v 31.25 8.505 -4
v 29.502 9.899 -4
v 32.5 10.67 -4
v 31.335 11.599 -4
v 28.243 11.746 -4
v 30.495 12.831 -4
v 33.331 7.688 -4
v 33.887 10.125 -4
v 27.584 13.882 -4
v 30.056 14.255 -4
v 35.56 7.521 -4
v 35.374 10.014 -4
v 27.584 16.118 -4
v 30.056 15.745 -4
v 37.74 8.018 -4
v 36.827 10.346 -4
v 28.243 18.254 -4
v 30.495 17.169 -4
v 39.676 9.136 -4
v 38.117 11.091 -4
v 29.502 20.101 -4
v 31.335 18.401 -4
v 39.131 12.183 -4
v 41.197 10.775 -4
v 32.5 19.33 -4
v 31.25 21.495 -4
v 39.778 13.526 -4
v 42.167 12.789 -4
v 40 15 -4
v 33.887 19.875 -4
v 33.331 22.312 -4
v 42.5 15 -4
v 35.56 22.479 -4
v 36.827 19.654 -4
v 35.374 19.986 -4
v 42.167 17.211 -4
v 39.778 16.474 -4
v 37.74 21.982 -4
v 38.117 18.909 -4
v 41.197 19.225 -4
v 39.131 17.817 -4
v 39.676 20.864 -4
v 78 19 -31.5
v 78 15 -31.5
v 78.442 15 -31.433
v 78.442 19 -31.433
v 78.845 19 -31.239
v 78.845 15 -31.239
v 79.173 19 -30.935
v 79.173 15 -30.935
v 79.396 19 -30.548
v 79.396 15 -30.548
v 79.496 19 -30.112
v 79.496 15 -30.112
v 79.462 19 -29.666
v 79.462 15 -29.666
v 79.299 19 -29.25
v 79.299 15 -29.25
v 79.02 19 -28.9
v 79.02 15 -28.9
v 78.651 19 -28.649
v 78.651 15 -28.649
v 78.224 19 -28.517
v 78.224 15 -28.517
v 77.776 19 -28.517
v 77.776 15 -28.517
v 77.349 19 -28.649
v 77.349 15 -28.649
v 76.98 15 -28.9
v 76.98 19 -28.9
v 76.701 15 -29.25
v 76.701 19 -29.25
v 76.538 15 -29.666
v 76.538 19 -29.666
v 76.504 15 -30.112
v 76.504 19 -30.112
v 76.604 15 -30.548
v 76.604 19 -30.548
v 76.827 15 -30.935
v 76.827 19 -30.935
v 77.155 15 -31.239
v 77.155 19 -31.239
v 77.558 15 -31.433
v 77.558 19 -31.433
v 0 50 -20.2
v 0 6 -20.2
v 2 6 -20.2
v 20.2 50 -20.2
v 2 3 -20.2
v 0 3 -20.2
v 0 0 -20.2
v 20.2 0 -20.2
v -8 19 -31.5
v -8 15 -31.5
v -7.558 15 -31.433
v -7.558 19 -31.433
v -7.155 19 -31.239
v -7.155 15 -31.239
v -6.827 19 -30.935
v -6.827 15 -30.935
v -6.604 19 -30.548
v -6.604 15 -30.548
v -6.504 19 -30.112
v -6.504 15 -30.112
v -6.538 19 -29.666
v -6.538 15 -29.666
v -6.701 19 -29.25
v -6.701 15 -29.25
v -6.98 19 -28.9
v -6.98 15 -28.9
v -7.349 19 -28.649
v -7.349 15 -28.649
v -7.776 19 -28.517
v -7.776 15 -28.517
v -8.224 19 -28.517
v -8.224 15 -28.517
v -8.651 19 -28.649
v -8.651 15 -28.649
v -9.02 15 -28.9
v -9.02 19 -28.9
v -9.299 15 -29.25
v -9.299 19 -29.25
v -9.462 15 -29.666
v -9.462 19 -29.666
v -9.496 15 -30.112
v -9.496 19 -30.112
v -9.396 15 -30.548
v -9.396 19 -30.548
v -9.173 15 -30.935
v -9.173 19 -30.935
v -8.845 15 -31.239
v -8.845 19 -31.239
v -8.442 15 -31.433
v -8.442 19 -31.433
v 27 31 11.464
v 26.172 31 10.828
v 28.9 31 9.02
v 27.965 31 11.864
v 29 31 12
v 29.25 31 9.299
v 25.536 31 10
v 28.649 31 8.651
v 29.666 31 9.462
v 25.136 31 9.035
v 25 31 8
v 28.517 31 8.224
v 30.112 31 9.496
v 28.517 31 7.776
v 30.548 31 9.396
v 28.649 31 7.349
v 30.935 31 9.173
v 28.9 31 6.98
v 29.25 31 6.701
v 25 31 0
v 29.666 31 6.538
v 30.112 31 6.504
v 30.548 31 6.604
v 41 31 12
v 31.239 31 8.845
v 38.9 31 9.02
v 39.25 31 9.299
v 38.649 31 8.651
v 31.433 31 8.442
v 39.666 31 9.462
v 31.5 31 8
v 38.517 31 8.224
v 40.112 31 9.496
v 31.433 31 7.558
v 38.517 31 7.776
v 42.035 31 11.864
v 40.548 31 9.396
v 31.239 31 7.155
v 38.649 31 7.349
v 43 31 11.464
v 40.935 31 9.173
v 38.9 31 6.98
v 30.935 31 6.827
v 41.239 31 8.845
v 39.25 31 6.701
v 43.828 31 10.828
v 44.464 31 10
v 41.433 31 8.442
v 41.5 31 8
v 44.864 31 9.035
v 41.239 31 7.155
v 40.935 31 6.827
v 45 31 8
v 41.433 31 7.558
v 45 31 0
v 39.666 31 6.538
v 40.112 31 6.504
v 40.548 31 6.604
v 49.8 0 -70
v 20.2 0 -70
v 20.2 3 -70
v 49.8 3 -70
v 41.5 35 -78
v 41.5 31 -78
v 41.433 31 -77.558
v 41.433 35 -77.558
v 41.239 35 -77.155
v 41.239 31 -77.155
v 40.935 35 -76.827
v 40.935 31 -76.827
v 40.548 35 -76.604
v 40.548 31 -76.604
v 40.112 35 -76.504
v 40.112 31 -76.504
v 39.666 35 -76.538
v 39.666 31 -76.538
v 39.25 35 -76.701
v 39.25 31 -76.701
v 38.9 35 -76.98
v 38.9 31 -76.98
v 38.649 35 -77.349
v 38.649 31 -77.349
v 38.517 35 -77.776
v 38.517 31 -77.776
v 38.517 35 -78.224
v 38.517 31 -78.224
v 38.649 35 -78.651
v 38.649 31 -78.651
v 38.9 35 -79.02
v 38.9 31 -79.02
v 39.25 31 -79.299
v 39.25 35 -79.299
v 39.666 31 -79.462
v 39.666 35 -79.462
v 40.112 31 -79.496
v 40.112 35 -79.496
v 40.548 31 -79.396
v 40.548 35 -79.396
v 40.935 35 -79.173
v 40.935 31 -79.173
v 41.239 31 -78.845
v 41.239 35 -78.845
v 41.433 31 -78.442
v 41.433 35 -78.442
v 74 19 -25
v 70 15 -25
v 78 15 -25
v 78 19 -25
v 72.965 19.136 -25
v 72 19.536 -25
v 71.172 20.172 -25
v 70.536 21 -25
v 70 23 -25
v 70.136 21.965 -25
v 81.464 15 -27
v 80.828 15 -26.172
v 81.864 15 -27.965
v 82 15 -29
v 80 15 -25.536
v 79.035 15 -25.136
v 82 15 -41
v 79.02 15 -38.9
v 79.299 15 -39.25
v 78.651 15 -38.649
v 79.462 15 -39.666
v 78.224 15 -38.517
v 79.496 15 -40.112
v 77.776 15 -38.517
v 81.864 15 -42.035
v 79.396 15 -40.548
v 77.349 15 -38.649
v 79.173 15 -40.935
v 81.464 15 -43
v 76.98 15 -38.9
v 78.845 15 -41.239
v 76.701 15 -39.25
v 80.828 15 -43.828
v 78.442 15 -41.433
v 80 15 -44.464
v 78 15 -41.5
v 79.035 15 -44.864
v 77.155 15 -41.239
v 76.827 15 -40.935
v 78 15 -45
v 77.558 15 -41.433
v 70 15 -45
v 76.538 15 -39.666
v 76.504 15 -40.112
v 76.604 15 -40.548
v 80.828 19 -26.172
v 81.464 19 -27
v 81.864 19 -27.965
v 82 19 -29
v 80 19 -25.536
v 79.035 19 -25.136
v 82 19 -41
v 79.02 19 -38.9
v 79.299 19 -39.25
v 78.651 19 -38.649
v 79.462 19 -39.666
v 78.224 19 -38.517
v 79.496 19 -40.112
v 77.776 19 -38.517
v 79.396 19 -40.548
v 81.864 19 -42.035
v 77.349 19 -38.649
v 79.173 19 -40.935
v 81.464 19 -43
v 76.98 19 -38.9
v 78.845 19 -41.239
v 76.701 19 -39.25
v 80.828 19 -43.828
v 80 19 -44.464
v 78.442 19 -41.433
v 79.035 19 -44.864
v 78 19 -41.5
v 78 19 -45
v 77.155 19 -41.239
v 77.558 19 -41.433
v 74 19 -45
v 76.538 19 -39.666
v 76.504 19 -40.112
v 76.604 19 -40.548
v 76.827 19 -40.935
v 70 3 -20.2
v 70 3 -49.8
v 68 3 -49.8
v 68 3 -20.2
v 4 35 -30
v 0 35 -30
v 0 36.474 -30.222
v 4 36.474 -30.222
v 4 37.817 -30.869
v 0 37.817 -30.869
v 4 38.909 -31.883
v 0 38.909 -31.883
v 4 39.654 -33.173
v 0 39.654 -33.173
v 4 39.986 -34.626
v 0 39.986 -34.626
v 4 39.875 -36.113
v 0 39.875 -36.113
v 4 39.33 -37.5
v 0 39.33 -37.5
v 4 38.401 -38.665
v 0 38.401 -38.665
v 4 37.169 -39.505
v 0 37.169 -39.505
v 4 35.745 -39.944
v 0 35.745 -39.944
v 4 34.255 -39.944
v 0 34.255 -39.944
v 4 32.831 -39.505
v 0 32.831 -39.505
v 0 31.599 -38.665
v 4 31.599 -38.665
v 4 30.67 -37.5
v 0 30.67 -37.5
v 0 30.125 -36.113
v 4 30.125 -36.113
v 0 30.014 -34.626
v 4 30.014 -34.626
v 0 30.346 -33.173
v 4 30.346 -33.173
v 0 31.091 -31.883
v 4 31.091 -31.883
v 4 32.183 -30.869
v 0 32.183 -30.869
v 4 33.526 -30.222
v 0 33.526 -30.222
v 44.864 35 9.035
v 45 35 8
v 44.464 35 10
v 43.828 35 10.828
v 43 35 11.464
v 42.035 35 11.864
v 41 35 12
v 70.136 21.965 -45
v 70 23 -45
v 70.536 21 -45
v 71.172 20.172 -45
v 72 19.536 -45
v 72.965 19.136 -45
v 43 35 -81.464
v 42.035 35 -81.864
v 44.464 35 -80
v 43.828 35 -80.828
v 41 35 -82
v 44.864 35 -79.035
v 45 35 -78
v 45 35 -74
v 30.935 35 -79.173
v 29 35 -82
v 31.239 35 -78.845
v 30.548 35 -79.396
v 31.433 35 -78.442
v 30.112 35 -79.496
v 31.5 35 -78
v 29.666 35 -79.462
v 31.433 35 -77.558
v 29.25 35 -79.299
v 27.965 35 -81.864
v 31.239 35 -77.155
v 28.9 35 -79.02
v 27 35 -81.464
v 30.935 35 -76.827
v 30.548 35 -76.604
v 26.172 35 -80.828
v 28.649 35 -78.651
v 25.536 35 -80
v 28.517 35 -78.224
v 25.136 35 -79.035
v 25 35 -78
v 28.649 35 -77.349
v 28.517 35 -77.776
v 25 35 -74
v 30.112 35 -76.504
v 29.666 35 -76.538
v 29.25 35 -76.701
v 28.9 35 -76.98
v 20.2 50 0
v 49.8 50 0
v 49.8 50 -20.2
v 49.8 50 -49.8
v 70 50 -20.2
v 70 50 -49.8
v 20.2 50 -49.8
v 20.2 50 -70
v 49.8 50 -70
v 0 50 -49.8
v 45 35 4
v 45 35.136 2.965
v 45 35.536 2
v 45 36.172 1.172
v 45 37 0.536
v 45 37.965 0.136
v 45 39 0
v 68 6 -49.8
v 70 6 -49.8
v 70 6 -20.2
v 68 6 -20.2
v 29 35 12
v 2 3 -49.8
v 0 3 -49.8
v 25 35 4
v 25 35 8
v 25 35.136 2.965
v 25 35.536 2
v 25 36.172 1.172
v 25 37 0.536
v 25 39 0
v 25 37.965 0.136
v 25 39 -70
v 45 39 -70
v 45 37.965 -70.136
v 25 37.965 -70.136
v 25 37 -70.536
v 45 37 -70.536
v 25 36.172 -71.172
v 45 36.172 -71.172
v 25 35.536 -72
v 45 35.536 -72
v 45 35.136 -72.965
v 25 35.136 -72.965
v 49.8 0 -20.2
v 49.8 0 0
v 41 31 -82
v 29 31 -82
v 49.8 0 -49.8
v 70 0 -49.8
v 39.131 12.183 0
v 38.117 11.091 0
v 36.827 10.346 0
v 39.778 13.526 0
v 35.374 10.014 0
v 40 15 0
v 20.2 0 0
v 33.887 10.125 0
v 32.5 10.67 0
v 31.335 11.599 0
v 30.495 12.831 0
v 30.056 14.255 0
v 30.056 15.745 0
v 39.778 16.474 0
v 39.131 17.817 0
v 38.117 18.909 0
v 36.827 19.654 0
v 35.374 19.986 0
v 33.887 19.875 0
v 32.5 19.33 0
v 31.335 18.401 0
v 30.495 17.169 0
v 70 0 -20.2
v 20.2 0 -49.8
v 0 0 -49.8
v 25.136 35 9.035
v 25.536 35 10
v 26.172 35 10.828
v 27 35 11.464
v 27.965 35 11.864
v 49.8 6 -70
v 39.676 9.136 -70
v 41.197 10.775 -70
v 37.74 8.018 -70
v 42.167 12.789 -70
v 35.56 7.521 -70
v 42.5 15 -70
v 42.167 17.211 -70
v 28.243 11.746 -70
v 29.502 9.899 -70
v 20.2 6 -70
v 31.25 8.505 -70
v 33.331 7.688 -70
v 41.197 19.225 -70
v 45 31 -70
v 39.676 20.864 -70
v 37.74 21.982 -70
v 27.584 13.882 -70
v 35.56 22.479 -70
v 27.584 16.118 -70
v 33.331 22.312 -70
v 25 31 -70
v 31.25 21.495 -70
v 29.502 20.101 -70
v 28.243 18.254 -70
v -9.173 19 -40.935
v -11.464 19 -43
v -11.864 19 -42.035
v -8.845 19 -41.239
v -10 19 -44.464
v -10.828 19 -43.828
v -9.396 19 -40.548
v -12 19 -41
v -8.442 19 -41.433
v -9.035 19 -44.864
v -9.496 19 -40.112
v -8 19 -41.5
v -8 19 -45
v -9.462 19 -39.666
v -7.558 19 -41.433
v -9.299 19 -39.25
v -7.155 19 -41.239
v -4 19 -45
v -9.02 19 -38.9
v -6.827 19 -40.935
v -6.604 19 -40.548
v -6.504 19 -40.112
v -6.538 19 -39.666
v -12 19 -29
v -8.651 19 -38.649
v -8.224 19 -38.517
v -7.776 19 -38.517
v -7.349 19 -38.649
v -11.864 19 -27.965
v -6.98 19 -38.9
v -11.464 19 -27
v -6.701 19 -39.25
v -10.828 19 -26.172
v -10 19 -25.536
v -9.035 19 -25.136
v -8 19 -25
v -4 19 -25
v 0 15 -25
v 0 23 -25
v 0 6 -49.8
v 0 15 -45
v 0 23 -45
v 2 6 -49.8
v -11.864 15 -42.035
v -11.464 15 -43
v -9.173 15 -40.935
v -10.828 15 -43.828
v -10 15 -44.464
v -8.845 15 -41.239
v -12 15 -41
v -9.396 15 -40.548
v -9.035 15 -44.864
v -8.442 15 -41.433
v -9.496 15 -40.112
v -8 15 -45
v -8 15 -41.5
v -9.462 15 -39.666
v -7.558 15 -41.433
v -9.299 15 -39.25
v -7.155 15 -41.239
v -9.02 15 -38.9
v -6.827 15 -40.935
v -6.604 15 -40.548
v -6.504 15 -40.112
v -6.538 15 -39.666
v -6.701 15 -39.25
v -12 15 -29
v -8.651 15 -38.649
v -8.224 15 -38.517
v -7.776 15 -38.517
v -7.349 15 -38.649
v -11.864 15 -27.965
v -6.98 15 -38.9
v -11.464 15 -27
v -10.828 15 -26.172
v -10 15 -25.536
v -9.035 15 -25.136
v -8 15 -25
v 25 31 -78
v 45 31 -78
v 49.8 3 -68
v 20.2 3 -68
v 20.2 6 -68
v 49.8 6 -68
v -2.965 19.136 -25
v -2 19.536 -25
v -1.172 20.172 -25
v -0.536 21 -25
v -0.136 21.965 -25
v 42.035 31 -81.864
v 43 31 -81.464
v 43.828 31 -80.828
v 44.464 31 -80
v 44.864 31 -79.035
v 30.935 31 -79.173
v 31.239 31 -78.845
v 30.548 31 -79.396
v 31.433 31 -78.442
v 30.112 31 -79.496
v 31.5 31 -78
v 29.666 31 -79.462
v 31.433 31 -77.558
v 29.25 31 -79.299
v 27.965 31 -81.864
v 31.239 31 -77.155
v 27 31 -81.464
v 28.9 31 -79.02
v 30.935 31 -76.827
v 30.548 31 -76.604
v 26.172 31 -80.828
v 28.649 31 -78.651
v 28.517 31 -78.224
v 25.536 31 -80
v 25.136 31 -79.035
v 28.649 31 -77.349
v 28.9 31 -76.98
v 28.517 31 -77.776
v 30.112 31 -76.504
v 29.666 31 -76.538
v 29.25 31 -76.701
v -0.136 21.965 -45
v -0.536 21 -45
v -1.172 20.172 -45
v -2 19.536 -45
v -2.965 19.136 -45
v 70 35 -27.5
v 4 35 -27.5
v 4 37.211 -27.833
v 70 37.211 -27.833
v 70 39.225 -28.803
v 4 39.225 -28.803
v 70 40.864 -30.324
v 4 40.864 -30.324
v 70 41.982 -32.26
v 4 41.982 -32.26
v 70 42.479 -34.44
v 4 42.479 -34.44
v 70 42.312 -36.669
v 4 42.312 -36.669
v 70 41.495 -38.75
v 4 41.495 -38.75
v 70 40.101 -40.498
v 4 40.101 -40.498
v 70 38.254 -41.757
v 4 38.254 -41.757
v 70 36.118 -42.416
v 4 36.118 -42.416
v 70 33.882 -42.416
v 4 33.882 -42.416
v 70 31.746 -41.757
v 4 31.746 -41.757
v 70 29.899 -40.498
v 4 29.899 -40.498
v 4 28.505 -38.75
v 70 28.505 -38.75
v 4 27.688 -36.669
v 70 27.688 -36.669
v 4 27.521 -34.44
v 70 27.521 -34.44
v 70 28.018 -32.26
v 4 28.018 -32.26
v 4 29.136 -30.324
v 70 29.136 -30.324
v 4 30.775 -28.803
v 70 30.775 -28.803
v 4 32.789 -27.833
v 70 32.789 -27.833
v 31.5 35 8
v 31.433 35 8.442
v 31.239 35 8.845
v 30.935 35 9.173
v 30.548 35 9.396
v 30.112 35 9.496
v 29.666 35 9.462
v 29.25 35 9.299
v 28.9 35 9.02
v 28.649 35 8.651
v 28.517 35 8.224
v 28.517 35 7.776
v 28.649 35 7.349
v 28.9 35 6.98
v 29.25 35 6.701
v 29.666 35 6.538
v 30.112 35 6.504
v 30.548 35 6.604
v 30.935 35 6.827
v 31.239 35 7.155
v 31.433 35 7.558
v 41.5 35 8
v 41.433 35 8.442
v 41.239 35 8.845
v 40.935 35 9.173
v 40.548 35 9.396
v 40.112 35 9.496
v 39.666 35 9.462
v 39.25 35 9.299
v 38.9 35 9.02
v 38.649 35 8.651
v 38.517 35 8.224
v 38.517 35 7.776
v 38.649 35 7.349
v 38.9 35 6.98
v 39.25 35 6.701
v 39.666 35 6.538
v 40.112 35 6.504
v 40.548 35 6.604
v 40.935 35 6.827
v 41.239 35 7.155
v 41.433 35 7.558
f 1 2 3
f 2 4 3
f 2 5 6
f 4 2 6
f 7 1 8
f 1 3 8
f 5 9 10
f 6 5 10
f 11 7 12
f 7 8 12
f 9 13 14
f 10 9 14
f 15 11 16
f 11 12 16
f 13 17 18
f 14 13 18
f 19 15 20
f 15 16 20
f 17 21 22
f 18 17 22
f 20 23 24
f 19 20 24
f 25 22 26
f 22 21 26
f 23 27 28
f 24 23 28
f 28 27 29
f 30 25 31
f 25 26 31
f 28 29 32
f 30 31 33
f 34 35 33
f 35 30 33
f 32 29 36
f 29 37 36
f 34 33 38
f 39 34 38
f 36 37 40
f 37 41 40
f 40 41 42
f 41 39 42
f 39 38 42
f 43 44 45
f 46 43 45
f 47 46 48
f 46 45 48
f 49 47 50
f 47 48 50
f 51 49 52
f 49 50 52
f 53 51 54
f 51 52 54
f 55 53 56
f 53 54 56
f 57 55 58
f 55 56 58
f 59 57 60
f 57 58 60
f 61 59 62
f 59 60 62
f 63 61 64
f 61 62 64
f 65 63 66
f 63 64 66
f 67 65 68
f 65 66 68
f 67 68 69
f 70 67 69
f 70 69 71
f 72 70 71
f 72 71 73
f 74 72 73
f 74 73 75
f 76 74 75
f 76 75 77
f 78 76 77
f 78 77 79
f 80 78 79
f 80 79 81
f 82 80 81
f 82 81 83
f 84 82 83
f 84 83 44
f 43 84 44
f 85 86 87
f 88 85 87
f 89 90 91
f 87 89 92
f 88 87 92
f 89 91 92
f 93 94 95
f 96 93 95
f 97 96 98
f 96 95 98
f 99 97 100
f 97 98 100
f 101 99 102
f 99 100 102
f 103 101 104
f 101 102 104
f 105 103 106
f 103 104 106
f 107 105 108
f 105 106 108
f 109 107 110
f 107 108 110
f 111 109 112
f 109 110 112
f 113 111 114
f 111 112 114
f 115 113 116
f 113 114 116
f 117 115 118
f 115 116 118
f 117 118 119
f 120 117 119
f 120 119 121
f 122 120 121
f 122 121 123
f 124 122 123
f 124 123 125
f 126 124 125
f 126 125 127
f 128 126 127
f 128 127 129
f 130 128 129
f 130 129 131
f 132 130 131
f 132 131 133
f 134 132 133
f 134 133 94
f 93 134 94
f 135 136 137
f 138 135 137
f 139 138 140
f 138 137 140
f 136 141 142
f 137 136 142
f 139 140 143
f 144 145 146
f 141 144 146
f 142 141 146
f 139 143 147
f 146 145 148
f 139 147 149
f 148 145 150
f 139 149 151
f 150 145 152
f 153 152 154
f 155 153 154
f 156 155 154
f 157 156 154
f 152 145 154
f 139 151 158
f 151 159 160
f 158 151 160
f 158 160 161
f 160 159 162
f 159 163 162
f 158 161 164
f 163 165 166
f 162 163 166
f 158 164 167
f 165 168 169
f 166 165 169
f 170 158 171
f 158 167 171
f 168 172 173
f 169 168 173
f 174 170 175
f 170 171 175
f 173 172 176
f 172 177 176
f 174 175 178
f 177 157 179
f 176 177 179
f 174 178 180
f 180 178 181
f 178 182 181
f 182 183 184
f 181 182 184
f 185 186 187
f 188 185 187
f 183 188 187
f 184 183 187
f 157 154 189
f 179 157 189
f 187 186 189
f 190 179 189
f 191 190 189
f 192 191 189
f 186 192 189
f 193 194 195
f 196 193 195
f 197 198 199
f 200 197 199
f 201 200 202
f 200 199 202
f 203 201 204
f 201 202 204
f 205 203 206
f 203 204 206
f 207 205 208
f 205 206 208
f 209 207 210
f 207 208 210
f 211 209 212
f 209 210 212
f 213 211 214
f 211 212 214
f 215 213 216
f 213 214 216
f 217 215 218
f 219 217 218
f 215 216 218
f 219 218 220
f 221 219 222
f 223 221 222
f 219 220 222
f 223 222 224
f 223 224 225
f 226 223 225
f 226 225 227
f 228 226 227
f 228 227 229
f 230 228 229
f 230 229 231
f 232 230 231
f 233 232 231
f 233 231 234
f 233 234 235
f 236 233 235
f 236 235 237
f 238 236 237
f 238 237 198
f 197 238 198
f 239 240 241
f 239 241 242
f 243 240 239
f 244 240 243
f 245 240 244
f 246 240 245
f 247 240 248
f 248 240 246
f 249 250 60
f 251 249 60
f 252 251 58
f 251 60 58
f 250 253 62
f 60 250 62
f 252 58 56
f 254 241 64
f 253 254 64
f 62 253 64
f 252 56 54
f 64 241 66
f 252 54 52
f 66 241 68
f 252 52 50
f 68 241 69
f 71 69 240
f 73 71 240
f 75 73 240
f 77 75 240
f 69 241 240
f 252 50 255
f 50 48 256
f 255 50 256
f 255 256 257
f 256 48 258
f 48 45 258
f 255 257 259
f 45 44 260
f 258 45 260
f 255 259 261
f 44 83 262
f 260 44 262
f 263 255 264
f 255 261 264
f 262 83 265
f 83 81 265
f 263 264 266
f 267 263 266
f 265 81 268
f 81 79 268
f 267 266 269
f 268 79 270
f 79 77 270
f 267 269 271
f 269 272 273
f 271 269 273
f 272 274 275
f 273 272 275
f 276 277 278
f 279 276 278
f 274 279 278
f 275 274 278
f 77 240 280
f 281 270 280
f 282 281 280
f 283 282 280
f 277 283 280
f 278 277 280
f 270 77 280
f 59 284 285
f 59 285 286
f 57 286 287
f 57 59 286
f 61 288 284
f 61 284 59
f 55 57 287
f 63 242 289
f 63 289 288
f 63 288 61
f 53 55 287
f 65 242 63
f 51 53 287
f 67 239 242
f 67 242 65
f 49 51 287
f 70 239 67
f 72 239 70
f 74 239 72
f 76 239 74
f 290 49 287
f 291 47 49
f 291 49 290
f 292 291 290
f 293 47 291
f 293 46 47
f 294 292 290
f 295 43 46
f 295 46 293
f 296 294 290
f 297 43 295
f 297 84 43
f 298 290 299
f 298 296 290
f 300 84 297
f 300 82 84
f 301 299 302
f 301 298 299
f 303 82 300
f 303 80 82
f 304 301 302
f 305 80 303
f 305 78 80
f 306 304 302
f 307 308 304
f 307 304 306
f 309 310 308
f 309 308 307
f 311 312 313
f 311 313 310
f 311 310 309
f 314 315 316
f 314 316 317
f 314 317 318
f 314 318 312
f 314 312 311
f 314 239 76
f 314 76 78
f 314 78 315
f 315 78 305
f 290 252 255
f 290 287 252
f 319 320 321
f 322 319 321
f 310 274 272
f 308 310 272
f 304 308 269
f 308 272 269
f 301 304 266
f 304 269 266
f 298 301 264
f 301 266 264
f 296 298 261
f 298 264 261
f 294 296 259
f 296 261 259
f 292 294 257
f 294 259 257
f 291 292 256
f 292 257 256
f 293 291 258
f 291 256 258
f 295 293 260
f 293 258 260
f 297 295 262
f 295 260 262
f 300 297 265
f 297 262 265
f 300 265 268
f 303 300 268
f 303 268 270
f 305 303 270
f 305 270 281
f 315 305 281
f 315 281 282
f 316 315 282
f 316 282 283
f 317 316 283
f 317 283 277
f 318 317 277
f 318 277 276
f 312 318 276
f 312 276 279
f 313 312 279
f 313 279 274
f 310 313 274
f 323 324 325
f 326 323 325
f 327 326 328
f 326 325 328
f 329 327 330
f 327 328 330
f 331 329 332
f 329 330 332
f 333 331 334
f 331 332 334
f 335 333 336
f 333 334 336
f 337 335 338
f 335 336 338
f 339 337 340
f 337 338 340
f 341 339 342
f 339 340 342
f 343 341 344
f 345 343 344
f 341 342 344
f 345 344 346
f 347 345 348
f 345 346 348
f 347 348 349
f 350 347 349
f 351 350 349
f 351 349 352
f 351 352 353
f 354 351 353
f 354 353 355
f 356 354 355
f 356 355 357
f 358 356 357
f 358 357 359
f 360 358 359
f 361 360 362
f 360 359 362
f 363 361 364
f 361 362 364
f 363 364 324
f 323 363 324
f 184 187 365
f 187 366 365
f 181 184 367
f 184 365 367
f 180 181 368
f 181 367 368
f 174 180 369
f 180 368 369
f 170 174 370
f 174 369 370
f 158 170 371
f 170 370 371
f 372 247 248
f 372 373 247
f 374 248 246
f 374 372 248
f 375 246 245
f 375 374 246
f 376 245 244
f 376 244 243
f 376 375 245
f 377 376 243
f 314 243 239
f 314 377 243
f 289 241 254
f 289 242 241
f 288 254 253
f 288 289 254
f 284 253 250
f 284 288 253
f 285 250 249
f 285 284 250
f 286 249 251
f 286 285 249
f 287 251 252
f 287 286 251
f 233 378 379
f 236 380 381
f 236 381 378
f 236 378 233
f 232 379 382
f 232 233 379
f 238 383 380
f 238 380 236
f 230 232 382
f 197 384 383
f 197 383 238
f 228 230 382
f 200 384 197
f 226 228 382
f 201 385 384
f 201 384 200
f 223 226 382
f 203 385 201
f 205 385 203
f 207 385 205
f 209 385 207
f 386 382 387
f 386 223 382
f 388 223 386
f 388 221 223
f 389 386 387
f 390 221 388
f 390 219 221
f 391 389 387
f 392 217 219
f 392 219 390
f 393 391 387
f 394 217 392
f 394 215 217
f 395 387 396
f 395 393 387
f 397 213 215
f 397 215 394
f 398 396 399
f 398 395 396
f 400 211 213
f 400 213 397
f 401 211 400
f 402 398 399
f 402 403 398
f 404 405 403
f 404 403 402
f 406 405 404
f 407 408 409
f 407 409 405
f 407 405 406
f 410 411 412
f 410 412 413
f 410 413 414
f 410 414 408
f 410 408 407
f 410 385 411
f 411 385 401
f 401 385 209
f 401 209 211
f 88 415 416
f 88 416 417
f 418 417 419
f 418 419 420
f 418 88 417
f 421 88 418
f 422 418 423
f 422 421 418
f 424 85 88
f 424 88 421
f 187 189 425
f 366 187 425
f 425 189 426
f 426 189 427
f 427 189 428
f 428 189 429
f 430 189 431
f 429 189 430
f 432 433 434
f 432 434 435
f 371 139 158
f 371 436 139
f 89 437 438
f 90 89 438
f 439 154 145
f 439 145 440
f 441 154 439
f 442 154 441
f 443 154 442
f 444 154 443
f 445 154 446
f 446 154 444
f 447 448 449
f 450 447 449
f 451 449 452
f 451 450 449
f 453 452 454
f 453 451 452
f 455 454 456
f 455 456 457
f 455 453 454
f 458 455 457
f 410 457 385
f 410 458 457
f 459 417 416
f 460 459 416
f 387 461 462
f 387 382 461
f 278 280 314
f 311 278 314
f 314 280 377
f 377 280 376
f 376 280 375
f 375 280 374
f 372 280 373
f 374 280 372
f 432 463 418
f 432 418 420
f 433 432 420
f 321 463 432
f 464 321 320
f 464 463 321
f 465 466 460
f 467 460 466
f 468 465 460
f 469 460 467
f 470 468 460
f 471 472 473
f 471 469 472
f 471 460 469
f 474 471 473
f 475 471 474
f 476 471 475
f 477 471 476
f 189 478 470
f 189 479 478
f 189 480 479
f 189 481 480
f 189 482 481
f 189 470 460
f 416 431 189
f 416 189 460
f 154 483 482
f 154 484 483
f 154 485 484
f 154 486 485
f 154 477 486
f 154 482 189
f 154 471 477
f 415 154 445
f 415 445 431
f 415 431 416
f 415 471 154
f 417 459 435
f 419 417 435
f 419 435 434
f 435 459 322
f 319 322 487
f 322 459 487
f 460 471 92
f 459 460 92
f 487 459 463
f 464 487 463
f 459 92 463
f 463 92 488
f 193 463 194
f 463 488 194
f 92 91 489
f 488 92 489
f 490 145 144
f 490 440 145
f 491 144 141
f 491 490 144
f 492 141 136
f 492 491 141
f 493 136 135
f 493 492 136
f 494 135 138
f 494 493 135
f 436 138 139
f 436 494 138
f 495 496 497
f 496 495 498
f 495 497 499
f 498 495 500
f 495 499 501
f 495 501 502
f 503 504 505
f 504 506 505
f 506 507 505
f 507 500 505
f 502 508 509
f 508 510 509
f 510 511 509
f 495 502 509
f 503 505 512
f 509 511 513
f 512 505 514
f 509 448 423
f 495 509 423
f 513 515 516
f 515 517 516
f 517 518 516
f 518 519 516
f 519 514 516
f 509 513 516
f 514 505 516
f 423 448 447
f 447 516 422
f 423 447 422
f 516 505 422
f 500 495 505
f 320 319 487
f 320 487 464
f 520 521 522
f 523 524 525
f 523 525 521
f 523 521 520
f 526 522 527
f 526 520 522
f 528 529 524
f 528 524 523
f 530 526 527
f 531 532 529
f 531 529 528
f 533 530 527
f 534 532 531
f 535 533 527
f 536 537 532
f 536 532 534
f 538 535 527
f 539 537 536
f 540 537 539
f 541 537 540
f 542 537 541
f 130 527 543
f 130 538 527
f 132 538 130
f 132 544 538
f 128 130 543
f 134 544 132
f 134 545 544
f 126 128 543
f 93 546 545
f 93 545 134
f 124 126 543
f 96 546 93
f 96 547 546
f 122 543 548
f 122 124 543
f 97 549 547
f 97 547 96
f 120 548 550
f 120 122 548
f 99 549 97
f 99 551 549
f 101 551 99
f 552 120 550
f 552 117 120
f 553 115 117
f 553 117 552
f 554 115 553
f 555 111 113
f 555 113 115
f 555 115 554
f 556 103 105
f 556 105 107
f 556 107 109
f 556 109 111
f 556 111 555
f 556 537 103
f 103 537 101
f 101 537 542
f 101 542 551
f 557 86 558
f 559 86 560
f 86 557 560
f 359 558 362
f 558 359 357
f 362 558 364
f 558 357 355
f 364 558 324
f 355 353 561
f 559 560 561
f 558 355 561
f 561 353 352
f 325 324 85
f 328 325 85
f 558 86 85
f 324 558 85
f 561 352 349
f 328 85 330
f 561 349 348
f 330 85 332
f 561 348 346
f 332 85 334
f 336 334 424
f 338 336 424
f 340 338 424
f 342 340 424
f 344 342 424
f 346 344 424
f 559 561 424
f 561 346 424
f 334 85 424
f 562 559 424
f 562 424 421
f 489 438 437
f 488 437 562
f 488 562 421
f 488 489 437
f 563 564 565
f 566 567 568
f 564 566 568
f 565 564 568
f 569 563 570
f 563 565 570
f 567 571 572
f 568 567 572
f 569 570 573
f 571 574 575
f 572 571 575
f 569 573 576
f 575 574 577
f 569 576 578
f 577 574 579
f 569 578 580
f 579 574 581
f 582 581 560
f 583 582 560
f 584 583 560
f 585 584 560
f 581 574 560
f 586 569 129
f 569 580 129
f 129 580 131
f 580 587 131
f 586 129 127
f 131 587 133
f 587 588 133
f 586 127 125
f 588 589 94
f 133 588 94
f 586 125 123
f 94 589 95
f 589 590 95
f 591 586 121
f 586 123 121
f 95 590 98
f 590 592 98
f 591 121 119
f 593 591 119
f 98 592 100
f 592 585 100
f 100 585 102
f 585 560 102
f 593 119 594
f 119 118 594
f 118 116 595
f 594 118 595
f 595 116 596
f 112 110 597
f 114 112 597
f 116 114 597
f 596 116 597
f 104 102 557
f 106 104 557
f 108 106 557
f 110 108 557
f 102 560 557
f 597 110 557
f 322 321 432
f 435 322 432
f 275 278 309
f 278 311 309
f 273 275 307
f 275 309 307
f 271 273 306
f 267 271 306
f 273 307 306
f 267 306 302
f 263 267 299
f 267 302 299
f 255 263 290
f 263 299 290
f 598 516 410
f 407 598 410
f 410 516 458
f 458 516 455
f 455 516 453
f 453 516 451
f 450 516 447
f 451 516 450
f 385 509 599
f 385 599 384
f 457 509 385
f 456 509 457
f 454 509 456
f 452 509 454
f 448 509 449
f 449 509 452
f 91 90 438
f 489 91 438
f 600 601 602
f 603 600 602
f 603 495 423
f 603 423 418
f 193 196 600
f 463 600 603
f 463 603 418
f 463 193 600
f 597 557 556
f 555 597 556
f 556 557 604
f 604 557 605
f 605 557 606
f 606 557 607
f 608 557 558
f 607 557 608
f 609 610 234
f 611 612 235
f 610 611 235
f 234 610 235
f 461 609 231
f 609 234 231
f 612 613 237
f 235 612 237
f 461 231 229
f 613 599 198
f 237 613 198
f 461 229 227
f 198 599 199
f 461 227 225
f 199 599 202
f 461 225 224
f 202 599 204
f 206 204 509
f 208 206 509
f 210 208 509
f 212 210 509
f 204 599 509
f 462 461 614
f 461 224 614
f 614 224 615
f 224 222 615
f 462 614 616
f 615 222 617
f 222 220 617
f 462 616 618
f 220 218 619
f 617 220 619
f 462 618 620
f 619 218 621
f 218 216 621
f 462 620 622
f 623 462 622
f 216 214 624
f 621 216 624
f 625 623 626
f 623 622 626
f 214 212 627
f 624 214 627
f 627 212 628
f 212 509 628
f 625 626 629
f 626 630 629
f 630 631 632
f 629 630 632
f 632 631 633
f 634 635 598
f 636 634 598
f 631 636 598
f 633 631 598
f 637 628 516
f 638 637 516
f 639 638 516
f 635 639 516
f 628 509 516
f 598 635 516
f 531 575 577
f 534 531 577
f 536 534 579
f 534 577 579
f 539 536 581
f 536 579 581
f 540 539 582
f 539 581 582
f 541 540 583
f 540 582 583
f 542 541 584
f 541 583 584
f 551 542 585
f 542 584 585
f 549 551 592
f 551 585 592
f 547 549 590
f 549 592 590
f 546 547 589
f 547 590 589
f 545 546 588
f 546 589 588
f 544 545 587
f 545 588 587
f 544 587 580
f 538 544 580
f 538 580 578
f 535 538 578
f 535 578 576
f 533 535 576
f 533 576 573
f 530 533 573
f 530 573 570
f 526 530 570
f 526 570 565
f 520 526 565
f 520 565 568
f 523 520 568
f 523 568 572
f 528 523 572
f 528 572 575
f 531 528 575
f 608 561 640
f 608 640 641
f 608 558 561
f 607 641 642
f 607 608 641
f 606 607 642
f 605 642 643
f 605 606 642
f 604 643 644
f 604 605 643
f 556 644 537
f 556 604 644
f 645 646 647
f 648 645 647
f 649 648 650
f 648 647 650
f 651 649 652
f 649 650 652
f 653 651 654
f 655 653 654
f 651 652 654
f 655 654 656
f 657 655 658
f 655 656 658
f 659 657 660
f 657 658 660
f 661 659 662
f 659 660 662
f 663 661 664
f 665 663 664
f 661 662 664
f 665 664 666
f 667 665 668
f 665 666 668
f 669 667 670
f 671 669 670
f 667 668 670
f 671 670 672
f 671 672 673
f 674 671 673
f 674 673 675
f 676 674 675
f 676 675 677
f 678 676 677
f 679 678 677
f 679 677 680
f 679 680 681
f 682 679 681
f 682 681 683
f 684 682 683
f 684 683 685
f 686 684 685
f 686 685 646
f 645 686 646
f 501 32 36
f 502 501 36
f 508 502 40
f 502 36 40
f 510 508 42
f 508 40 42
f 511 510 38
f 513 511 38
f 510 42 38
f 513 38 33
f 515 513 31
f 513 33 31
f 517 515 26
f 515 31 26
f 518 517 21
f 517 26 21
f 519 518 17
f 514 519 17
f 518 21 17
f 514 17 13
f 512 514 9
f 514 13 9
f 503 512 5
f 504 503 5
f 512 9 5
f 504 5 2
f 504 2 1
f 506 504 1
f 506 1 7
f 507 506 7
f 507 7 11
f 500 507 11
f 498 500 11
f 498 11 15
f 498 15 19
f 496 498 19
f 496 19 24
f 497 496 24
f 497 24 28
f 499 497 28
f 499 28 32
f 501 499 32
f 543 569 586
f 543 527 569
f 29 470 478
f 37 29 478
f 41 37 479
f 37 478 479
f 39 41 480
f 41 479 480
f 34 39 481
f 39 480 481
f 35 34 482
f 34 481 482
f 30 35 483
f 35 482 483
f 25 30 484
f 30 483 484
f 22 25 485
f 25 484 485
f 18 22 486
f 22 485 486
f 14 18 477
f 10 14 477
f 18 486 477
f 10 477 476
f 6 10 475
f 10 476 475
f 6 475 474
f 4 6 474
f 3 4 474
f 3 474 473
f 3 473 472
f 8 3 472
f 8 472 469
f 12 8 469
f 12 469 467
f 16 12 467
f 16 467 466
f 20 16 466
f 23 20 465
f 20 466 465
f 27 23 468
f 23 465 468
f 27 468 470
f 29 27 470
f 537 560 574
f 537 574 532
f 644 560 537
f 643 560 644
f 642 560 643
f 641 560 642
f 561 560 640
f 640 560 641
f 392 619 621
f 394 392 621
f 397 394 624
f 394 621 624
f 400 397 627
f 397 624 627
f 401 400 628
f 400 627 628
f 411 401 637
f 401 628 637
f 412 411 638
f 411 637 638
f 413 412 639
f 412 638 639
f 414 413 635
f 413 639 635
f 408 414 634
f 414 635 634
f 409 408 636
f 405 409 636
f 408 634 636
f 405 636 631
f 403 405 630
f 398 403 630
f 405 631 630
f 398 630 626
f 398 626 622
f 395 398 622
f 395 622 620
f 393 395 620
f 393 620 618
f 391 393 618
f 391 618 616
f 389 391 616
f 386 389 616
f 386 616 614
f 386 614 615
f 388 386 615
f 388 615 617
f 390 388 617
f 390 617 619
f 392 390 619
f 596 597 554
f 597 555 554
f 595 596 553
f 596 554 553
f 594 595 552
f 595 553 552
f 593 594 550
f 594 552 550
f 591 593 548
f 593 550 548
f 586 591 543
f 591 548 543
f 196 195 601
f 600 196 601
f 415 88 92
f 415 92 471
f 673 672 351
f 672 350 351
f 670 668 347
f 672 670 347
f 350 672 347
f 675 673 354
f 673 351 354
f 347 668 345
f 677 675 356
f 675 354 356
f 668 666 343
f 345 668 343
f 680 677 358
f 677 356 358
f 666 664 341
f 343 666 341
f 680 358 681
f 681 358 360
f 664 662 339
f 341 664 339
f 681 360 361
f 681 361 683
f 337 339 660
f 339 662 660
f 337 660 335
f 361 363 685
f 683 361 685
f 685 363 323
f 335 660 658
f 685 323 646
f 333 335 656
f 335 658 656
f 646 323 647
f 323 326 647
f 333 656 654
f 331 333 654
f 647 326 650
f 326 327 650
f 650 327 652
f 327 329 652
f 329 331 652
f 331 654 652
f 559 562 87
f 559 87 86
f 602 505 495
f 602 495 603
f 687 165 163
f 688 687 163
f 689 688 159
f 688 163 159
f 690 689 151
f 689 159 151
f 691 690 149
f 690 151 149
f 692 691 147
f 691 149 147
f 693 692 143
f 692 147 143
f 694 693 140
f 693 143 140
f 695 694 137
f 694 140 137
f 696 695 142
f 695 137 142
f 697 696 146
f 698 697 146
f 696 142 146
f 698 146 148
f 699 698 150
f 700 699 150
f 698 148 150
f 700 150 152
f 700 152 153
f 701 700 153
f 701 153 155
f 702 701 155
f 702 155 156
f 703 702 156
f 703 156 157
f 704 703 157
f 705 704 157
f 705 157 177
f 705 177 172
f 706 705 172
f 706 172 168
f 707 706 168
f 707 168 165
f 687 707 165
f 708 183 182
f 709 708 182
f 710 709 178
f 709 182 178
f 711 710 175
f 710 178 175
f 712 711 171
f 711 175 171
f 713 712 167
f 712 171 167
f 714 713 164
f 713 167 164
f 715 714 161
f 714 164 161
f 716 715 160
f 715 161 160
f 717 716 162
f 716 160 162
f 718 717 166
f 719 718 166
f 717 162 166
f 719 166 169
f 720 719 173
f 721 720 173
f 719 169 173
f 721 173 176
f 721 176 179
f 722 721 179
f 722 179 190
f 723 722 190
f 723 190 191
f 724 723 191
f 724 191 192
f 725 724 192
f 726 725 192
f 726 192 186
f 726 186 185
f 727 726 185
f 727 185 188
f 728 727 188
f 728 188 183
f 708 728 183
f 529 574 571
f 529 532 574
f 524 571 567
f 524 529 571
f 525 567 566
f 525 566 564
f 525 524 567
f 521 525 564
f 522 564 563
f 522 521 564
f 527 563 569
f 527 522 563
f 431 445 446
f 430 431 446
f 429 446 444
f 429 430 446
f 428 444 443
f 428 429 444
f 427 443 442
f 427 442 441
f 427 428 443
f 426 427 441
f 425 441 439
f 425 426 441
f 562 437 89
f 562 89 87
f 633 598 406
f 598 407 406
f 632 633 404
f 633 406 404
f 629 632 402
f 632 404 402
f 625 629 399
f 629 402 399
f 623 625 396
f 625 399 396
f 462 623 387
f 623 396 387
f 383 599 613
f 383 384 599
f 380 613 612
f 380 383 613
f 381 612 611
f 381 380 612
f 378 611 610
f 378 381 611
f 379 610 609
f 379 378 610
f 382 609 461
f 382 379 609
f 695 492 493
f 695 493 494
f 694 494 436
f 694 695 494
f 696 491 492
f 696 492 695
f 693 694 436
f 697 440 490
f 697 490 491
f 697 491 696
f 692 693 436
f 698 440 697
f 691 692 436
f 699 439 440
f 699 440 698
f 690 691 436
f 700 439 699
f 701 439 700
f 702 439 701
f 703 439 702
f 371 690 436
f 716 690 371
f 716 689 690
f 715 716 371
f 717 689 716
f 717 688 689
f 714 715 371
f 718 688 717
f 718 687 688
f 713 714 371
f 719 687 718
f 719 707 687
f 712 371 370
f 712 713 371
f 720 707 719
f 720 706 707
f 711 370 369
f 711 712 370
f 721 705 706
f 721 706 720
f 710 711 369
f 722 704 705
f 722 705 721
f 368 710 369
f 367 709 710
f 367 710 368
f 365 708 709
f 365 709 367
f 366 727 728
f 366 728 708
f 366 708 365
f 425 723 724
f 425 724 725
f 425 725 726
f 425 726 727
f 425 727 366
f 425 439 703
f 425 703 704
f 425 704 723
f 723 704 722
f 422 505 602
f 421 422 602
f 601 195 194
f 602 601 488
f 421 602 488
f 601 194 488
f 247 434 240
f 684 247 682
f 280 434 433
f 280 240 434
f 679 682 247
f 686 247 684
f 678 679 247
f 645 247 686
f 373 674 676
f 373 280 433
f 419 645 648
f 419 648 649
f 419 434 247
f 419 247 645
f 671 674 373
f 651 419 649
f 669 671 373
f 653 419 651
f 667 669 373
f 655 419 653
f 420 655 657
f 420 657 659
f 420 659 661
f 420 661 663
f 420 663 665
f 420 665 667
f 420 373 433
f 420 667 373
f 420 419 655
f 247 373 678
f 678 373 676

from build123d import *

# Parameters (mm, degrees)
ESQUISSE1_W              = 70
ESQUISSE1_H              = 50
BOSS_EXTRU_1_DEPTH       = 70
ESQUISSE2_R              = 7.5
ENL_V_MAT_EXTRU_1_DEPTH  = 71
ESQUISSE3_R              = 7.5
ENL_V_MAT_EXTRU_2_DEPTH  = 71
ESQUISSE4_W              = 20.2
ESQUISSE4_H              = 20.2
ENL_V_MAT_EXTRU_3_DEPTH  = 51
ESQUISSE7_R              = 11.73674641
ESQUISSE7_R_2            = 5
BOSS_EXTRU_3_DEPTH       = 4
ESQUISSE8_R              = 12.196693844
ESQUISSE8_R_2            = 5
BOSS_EXTRU_4_DEPTH       = 4
ESQUISSE9_W              = 2
ESQUISSE9_H              = 3
ENL_V_MAT_EXTRU_4_DEPTH  = 50.8
ESQUISSE10_W             = 2
ESQUISSE10_H             = 3
ENL_V_MAT_EXTRU_5_DEPTH  = 50.8
ESQUISSE11_W             = 2
ESQUISSE11_H             = 3
ENL_V_MAT_EXTRU_6_DEPTH  = 50.8
ESQUISSE12_W             = 20
ESQUISSE12_H             = 4
BOSS_EXTRU_5_DEPTH       = 12
ESQUISSE13_R             = 1.5
ENL_V_MAT_EXTRU_7_DEPTH  = 36
CONG_1_R                 = 4
ESQUISSE14_W             = 20
ESQUISSE14_H             = 4
BOSS_EXTRU_6_DEPTH       = 12
ESQUISSE15_R             = 1.5
ENL_V_MAT_EXTRU_8_DEPTH  = 36
CONG_3_R                 = 4
ESQUISSE16_W             = 20
ESQUISSE16_H             = 4
BOSS_EXTRU_7_DEPTH       = 12
ESQUISSE17_R             = 1.5
ENL_V_MAT_EXTRU_9_DEPTH  = 20
CONG_4_R                 = 4
ESQUISSE18_W             = 20
ESQUISSE18_H             = 4
BOSS_EXTRU_8_DEPTH       = 12
ESQUISSE19_R             = 1.5
ENL_V_MAT_EXTRU_10_DEPTH = 20
CONG_5_R                 = 4
CONG_6_R                 = 4


with BuildPart() as part:
    # Esquisse1 → Boss.-Extru.1 (new body)
    with BuildSketch(Plane(origin=(0, 0, 0), x_dir=(0, 0, -1), z_dir=(1, 0, 0))):
        with Locations((35, 25)):
            Rectangle(ESQUISSE1_W, ESQUISSE1_H)
    extrude(amount=BOSS_EXTRU_1_DEPTH)

    # Esquisse2 → Enlèv. mat.-Extru.1 (cut, through all)
    with BuildSketch(Plane.XY):
        with Locations((35, 15)):
            Circle(ESQUISSE2_R)
    extrude(amount=-ENL_V_MAT_EXTRU_1_DEPTH, mode=Mode.SUBTRACT)

    # Esquisse3 → Enlèv. mat.-Extru.2 (cut, through all)
    with BuildSketch(Plane.ZY):
        with Locations((-35, 35)):
            Circle(ESQUISSE3_R)
    extrude(amount=-ENL_V_MAT_EXTRU_2_DEPTH, mode=Mode.SUBTRACT)

    # Esquisse4 → Enlèv. mat.-Extru.3 (cut, through all)
    with BuildSketch(Plane.XZ):
        with Locations((10.1, -59.9)):
            Rectangle(ESQUISSE4_W, ESQUISSE4_H)
        with Locations((10.1, -10.1)):
            Rectangle(ESQUISSE4_W, ESQUISSE4_H)
        with Locations((59.9, -10.1)):
            Rectangle(ESQUISSE4_W, ESQUISSE4_H)
        with Locations((59.9, -59.9)):
            Rectangle(ESQUISSE4_W, ESQUISSE4_H)
    extrude(amount=-ENL_V_MAT_EXTRU_3_DEPTH, mode=Mode.SUBTRACT)

    # Esquisse7 → Boss.-Extru.3 (add)
    with BuildSketch(Plane.XY):
        with Locations((35, 15)):
            Circle(ESQUISSE7_R)
        with Locations((35, 15)):
            Circle(ESQUISSE7_R_2, mode=Mode.SUBTRACT)
    extrude(amount=-BOSS_EXTRU_3_DEPTH)

    # Esquisse8 → Boss.-Extru.4 (add)
    with BuildSketch(Plane.ZY):
        with Locations((-35, 35)):
            Circle(ESQUISSE8_R)
        with Locations((-35, 35)):
            Circle(ESQUISSE8_R_2, mode=Mode.SUBTRACT)
    extrude(amount=-BOSS_EXTRU_4_DEPTH)

    # Esquisse9 → Enlèv. mat.-Extru.4 (cut, through all)
    with BuildSketch(Plane.ZY.offset(-20.2)):
        with Locations((-69, 4.5)):
            Rectangle(ESQUISSE9_W, ESQUISSE9_H)
    extrude(amount=-ENL_V_MAT_EXTRU_4_DEPTH, mode=Mode.SUBTRACT)

    # Esquisse10 → Enlèv. mat.-Extru.5 (cut, through all)
    with BuildSketch(Plane(origin=(0, 0, -49.8), x_dir=(-1, 0, 0), z_dir=(0, 0, -1))):
        with Locations((-1, 4.5)):
            Rectangle(ESQUISSE10_W, ESQUISSE10_H)
    extrude(amount=-ENL_V_MAT_EXTRU_5_DEPTH, mode=Mode.SUBTRACT)

    # Esquisse11 → Enlèv. mat.-Extru.6 (cut, through all)
    with BuildSketch(Plane(origin=(0, 0, -49.8), x_dir=(-1, 0, 0), z_dir=(0, 0, -1))):
        with Locations((-69, 4.5)):
            Rectangle(ESQUISSE11_W, ESQUISSE11_H)
    extrude(amount=-ENL_V_MAT_EXTRU_6_DEPTH, mode=Mode.SUBTRACT)

    # Esquisse12 → Boss.-Extru.5 (add)
    with BuildSketch(Plane.ZY):
        with Locations((-35, 17)):
            Rectangle(ESQUISSE12_W, ESQUISSE12_H)
    extrude(amount=BOSS_EXTRU_5_DEPTH)

    # Esquisse13 → Enlèv. mat.-Extru.7 (cut, through all)
    with BuildSketch(Plane.XZ.offset(-15)):
        with Locations(Location((-8, -30, 0), (0, 0, 270))):  # turned: the seam where the file's is
            Circle(ESQUISSE13_R)
        with Locations(Location((-8, -40, 0), (0, 0, 270))):  # turned: the seam where the file's is
            Circle(ESQUISSE13_R)
    extrude(amount=-ENL_V_MAT_EXTRU_7_DEPTH, mode=Mode.SUBTRACT)

    # Congé1
    cong_1_edges = [part.edges().sort_by_distance(p)[0] for p in [
        (-12, 17, -25),
        (-12, 17, -45),
    ]]
    fillet(cong_1_edges, radius=CONG_1_R)

    # Esquisse14 → Boss.-Extru.6 (add)
    with BuildSketch(Plane(origin=(70, 0, 0), x_dir=(0, 0, -1), z_dir=(1, 0, 0))):
        with Locations((35, 17)):
            Rectangle(ESQUISSE14_W, ESQUISSE14_H)
    extrude(amount=BOSS_EXTRU_6_DEPTH)

    # Esquisse15 → Enlèv. mat.-Extru.8 (cut, through all)
    with BuildSketch(Plane.XZ.offset(-15)):
        with Locations(Location((78, -40, 0), (0, 0, 270))):  # turned: the seam where the file's is
            Circle(ESQUISSE15_R)
        with Locations(Location((78, -30, 0), (0, 0, 270))):  # turned: the seam where the file's is
            Circle(ESQUISSE15_R)
    extrude(amount=-ENL_V_MAT_EXTRU_8_DEPTH, mode=Mode.SUBTRACT)

    # Congé3
    cong_3_edges = [part.edges().sort_by_distance(p)[0] for p in [
        (82, 17, -45),
        (82, 17, -25),
    ]]
    fillet(cong_3_edges, radius=CONG_3_R)

    # Esquisse16 → Boss.-Extru.7 (add)
    with BuildSketch(Plane.XY):
        with Locations((35, 33)):
            Rectangle(ESQUISSE16_W, ESQUISSE16_H)
    extrude(amount=BOSS_EXTRU_7_DEPTH)

    # Esquisse17 → Enlèv. mat.-Extru.9 (cut, through all)
    with BuildSketch(Plane.XZ.offset(-31)):
        with Locations((40, 8)):
            Circle(ESQUISSE17_R)
        with Locations((30, 8)):
            Circle(ESQUISSE17_R)
    extrude(amount=-ENL_V_MAT_EXTRU_9_DEPTH, mode=Mode.SUBTRACT)

    # Congé4
    cong_4_edges = [part.edges().sort_by_distance(p)[0] for p in [
        (45, 33, 12),
        (25, 33, 12),
    ]]
    fillet(cong_4_edges, radius=CONG_4_R)

    # Esquisse18 → Boss.-Extru.8 (add)
    with BuildSketch(Plane(origin=(0, 0, -70), x_dir=(-1, 0, 0), z_dir=(0, 0, -1))):
        with Locations((-35, 33)):
            Rectangle(ESQUISSE18_W, ESQUISSE18_H)
    extrude(amount=BOSS_EXTRU_8_DEPTH)

    # Esquisse19 → Enlèv. mat.-Extru.10 (cut, through all)
    with BuildSketch(Plane.XZ.offset(-31)):
        with Locations((30, -78)):
            Circle(ESQUISSE19_R)
        with Locations((40, -78)):
            Circle(ESQUISSE19_R)
    extrude(amount=-ENL_V_MAT_EXTRU_10_DEPTH, mode=Mode.SUBTRACT)

    # Congé5
    cong_5_edges = [part.edges().sort_by_distance(p)[0] for p in [
        (25, 33, -82),
        (45, 33, -82),
    ]]
    fillet(cong_5_edges, radius=CONG_5_R)

    # Congé6
    cong_6_edges = [part.edges().sort_by_distance(p)[0] for p in [
        (0, 19, -35),
        (70, 19, -35),
        (35, 35, 0),
        (35, 35, -70),
    ]]
    fillet(cong_6_edges, radius=CONG_6_R)


solid = part.part
